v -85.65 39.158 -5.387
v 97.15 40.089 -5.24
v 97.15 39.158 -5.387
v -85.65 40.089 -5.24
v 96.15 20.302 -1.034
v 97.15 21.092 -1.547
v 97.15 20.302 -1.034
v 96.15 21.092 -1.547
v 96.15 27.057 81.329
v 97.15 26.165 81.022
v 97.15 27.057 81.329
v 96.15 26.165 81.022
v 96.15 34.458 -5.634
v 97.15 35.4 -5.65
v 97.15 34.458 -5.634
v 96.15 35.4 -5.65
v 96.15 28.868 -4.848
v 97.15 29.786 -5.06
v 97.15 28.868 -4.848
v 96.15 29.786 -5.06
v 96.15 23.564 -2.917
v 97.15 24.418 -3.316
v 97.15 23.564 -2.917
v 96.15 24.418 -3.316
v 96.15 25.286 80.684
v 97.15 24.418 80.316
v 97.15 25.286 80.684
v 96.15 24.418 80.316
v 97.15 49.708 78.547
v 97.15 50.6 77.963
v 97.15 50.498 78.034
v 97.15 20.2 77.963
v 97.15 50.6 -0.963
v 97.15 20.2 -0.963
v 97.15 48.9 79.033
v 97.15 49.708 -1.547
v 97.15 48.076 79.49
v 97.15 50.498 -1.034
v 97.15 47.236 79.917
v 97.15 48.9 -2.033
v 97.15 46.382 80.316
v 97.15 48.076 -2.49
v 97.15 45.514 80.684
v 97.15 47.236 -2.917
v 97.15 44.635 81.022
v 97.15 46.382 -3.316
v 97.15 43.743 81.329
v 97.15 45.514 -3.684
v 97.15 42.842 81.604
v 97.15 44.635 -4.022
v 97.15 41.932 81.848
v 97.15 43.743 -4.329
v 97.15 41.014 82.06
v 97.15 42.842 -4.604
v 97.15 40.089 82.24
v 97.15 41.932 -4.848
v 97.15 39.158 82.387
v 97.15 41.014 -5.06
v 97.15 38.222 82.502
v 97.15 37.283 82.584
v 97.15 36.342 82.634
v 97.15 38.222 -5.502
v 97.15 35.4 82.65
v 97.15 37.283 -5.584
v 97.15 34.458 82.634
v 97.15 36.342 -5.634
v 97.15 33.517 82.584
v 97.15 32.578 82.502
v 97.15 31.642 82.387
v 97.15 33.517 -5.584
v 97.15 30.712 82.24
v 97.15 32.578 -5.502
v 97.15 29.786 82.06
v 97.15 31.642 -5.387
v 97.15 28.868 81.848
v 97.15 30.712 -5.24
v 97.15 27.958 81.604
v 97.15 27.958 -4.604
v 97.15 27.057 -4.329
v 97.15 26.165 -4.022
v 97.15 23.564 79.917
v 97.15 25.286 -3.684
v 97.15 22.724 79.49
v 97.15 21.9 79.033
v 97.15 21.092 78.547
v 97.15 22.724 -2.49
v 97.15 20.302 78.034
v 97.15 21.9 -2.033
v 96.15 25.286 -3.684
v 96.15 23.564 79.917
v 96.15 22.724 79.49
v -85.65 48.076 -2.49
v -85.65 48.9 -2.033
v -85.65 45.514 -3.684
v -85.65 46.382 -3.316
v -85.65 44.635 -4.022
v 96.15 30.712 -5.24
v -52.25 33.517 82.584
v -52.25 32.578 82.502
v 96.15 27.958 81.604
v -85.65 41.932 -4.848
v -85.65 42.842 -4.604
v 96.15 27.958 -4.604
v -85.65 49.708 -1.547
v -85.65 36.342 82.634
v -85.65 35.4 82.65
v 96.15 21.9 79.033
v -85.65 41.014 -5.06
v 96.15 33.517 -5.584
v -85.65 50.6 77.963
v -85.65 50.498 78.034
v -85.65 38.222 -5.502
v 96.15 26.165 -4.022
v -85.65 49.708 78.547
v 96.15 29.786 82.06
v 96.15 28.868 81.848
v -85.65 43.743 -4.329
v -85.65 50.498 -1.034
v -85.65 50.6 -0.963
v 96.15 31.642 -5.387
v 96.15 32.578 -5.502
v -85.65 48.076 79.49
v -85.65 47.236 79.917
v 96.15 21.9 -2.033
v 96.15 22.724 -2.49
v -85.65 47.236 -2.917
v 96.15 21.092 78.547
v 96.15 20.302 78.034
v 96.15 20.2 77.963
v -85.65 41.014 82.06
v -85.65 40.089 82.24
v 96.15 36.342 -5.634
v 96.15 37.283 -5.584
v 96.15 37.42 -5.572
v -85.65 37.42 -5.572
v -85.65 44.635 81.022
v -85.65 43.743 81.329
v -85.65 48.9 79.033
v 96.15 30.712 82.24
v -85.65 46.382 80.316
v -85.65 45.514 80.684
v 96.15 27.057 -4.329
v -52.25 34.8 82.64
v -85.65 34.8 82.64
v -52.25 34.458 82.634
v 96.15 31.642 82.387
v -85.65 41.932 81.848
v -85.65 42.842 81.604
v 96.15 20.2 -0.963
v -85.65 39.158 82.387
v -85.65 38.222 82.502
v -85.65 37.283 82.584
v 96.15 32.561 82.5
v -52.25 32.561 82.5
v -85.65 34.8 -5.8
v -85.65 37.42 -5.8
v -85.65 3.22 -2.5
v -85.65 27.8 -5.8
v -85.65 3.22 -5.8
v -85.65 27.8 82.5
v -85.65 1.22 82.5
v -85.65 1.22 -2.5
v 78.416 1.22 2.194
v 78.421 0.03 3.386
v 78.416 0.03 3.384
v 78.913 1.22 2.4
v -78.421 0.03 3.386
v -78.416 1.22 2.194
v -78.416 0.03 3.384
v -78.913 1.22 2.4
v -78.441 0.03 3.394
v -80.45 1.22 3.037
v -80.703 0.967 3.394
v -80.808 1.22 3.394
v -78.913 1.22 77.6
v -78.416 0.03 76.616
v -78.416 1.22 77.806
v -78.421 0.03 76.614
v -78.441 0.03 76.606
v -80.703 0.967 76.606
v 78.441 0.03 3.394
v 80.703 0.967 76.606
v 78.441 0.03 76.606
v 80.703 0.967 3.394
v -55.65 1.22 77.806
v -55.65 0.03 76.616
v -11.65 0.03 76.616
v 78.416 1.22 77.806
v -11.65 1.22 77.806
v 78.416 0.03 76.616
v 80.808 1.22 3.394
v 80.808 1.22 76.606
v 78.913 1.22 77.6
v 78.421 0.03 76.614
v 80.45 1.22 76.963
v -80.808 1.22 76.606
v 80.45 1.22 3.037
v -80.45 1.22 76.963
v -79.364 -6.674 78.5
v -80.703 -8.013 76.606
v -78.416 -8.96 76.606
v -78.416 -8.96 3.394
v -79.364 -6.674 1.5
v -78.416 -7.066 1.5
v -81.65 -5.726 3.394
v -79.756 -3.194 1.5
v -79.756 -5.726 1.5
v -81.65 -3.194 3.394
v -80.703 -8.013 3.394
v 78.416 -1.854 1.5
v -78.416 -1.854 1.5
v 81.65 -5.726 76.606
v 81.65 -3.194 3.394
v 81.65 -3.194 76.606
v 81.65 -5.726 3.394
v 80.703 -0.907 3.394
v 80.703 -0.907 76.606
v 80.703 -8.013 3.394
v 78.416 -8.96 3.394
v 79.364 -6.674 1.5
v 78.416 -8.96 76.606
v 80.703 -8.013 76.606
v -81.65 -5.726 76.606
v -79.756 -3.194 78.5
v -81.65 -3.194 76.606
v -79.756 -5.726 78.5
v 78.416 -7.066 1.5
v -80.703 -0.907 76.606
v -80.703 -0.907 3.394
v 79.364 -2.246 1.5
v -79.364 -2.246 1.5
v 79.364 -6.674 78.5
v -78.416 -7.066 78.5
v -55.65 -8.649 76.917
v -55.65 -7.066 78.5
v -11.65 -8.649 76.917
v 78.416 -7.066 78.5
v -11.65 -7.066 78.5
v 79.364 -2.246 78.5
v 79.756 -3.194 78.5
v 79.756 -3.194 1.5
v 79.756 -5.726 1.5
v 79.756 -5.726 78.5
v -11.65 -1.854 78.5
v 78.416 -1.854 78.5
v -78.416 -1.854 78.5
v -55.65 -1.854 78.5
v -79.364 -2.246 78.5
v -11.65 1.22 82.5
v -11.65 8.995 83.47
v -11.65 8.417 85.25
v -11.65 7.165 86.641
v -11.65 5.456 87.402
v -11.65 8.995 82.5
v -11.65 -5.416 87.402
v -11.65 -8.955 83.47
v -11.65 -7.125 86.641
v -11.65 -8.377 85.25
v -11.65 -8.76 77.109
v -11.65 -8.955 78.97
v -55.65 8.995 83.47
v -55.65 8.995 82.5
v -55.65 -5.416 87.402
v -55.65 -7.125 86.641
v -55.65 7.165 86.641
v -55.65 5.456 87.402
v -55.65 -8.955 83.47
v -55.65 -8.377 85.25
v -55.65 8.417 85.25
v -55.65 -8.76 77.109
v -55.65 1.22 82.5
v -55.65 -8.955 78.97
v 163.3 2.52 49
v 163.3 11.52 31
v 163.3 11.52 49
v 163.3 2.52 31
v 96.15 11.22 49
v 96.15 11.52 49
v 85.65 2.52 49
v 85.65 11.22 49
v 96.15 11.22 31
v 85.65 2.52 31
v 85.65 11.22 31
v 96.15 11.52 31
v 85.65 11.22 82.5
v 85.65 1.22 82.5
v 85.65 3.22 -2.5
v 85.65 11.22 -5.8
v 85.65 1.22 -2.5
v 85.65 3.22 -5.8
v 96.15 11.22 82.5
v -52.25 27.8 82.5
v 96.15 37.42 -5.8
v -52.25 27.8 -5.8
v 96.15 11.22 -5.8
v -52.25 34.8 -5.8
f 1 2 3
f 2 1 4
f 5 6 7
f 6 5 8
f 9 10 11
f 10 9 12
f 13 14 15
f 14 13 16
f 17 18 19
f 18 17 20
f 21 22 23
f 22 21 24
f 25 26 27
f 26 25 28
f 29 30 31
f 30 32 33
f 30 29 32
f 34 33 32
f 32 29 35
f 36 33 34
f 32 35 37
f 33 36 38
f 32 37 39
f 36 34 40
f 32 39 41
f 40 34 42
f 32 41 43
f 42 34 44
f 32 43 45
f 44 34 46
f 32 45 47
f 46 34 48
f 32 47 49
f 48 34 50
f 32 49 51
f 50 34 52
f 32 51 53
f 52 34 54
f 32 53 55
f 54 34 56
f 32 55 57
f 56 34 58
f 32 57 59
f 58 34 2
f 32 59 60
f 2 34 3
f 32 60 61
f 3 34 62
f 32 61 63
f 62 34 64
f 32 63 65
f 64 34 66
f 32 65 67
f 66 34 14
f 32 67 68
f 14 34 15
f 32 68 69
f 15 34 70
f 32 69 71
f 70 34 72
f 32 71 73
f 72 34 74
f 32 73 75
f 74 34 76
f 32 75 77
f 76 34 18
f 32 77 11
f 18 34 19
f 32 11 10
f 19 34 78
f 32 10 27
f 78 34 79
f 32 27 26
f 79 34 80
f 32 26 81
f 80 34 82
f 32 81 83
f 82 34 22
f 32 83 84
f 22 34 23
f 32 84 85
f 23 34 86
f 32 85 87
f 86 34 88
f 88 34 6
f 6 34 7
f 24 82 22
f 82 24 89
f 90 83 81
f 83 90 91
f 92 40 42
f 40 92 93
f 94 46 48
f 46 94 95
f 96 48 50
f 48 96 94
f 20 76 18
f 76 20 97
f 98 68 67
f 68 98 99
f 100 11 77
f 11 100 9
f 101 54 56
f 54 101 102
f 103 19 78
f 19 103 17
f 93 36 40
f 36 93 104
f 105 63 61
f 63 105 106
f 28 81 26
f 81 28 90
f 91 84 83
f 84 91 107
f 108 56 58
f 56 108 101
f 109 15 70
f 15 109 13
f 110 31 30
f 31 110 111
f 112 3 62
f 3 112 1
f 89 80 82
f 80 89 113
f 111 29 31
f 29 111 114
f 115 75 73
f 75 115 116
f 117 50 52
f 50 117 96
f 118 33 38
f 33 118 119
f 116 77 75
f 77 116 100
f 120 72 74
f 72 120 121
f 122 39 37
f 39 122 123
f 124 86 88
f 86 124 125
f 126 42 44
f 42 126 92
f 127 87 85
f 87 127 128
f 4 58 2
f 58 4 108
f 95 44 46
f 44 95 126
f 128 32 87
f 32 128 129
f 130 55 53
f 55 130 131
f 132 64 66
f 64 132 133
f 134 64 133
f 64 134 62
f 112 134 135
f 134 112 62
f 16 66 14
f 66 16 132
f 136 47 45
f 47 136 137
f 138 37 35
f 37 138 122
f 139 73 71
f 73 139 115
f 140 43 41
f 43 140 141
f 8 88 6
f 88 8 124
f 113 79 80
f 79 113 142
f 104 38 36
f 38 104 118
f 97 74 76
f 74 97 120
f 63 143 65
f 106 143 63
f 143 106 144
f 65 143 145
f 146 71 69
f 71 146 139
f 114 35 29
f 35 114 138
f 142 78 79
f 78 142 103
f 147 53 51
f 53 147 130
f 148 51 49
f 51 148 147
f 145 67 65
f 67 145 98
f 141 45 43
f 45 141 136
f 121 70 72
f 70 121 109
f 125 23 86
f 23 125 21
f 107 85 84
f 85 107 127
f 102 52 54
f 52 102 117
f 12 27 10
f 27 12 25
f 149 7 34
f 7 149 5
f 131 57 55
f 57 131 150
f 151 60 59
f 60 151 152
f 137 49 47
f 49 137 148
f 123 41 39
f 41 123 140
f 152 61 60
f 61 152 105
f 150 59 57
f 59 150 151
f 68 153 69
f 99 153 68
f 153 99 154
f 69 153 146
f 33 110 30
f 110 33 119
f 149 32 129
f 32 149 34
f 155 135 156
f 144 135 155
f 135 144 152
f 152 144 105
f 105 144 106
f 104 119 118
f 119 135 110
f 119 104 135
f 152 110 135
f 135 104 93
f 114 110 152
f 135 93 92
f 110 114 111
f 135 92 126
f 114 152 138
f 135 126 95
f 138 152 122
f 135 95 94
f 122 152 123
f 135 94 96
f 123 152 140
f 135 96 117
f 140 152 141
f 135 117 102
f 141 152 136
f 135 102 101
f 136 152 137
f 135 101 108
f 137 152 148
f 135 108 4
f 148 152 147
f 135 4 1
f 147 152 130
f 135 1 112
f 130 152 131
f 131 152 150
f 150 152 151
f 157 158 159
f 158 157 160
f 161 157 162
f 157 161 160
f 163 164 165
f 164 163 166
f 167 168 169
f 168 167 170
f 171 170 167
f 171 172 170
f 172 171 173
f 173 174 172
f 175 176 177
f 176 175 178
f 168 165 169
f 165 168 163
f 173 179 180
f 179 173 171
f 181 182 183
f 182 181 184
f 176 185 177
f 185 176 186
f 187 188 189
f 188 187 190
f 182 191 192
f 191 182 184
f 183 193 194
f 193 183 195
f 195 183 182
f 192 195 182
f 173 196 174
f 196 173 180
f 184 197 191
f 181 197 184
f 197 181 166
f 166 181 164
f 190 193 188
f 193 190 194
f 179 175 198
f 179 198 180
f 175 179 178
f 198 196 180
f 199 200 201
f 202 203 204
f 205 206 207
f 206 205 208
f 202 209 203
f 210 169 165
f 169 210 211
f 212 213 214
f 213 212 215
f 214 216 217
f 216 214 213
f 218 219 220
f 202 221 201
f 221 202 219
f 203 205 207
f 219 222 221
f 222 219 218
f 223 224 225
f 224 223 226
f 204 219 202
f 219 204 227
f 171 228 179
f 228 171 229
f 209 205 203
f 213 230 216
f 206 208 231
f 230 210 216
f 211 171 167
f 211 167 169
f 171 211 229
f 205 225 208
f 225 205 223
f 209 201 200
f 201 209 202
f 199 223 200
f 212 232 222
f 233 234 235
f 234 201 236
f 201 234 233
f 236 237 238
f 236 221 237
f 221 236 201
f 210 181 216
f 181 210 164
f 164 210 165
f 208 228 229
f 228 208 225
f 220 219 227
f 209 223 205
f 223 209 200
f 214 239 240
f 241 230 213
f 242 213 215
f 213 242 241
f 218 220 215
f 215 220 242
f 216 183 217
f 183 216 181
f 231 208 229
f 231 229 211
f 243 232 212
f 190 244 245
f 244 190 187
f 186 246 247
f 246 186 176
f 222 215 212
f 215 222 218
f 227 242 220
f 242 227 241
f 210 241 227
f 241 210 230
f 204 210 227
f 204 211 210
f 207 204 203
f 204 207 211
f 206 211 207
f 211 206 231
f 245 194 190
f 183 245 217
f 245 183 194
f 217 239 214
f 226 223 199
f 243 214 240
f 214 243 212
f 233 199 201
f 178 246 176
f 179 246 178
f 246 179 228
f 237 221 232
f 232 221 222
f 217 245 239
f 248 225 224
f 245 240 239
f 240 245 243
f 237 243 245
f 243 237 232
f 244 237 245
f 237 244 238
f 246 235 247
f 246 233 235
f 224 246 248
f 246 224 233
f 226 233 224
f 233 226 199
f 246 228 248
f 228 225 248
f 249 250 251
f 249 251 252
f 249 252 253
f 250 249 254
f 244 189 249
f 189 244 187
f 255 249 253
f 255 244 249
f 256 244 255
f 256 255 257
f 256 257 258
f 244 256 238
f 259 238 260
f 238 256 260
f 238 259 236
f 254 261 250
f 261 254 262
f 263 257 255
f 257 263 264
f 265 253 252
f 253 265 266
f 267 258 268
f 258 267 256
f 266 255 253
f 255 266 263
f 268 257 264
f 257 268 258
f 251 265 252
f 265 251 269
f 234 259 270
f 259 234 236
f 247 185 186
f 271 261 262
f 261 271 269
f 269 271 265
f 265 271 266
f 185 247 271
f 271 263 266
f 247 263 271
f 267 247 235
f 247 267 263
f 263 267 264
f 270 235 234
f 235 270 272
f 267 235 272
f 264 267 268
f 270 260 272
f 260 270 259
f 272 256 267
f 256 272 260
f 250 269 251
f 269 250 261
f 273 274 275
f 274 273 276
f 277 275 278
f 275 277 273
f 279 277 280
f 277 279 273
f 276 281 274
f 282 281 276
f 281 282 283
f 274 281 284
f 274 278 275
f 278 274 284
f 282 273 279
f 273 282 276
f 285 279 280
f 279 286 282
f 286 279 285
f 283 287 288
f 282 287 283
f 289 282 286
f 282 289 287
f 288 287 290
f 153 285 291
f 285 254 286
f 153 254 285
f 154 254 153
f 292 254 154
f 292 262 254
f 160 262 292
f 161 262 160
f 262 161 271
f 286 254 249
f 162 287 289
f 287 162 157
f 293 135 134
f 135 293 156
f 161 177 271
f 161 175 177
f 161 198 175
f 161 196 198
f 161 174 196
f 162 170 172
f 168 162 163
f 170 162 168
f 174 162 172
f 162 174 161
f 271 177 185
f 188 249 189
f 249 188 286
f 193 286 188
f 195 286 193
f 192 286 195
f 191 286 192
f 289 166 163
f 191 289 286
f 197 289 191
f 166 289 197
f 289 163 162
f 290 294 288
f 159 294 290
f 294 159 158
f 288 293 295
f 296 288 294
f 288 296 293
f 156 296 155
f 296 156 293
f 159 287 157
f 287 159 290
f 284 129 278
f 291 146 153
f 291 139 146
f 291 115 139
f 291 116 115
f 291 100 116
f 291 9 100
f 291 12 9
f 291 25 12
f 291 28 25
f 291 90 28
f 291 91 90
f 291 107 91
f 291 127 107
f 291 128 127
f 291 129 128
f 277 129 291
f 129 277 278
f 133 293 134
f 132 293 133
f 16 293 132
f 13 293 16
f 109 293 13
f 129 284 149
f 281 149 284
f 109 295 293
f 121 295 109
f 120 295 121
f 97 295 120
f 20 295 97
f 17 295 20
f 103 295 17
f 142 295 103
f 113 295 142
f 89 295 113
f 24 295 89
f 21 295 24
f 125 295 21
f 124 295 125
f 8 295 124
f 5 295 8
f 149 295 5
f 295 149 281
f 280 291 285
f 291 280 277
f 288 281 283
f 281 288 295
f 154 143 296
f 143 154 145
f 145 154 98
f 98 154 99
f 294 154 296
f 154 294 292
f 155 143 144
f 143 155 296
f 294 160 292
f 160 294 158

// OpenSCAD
// file: ../chamferer.scad
INFINITY = 10000;
ATOM = .01;

module chamfer_tool(r, fn, tool) {
    if (tool=="sphere") {
        sphere(r, $fn=fn);
    }
    else if (tool=="hemisphere-up") {
        intersection() {
            sphere(r, $fn=fn);
            cylinder(r=r*2, h=r*2);
        }
    }
    else if (tool=="cone") {
        cylinder(r, r, 0, $fn=fn);
        scale([1, 1, -1])
        cylinder(r, r, 0, $fn=fn);
    }
    else if (tool=="cone-up") {
        cylinder(r, r, 0, $fn=fn, center=true);
    }
    else if (tool=="cone-down") {
        scale([1, 1, -1])
        cylinder(r, r, 0, $fn=fn, center=true);
    }
    else if (tool=="octahedron") {
        resize([r*2, r*2, r*2]) {
            cylinder(r, r, 0, $fn=4);
            scale([1, 1, -1])
            cylinder(r, r, 0, $fn=4);
        }
    }
    else if (tool=="pyramid") {
        resize([r*2, r*2, r*2]) {
            cylinder(r, r, 0, center=true, $fn=4);
        }
    }
    else if (tool=="rpyramid") {
        resize([r*2, r*2, r*2]) {
            cylinder(r, 0, r, center=true, $fn=4);
        }
    }
    else if (tool=="cylinder") {
        cylinder(r=r, h=ATOM, $fn=fn);
    }
    else if (tool=="cube") {
        cube(r*2, center=true);
    }
    else {
        assert(false, str("Unknown tool: ", tool));
    }
}

module shrinker(r, tool="sphere", fn=8) {
    if (!r) {
        children();
    }
    else {
        // re-invert+grow = fillet
        difference() {
            cube(INFINITY/2, center=true);

            // invert+grow = carve
            minkowski() {
                difference() {
                    cube(INFINITY, center=true);
                    children();
                }
                //cube(r, center=true);
                chamfer_tool(r, fn=fn, tool=tool);
            }
        }
    }
}

module chamferer(r, tool="sphere", fn=8, shrink=true, grow=true) {
    if (!r) {
        children();
    }
    else {
        minkowski() {
            if (shrink)
                shrinker(r, tool, fn) children();
            else
                children();
            
            if (grow)
                chamfer_tool(r, fn=fn, tool=tool);
        }
    }
}



cube(50);

translate([70, 0, 0])
chamferer(5, "hemisphere-up", $preview? 6*4 : 30)
//shrinker(5, "sphere", $preview? 6*4 : 30)
cube(50);

translate([70*2, 0, 0])
chamferer(5, "octahedron", grow=false)
cube(50);
// main file
use <../chamferer.scad>

BATT_L      = 146           +1;
BATT_W      = 108           +0.2;
BATT_TH     =  39           -2;

PHONE_L     = 163           +.3;
PHONE_W     =  77;
WALL        =   3.5;
BEXTEND     =  30           *0;

SCREW_DIST  = 127.5;


L    = PHONE_L+WALL*2 + (BATT_W-77)            -28;
W    = BATT_W+WALL*2;
TH   = 9+BATT_TH  +14.2 + WALL*2 + BEXTEND      -5;

CH   = WALL*1.25;

ATOM = .02;
FN   = $preview? 8 : 60;

echo(TH);

PHONE_CASE_L  = PHONE_L + 4*2;
PHONE_CASE_TH = 21;
PHONE_CASE_W  = PHONE_W + 4*2;

module phone_cavity(back_extension=0, just_case=false) {
    l = PHONE_L;
    w = PHONE_W;
    th = 9;
    ch = 3.5;
    // case
    bor =  4;
    cy  =  1.2;
    cth = PHONE_CASE_TH;
    xz  =  5.5;
    xy =   2;

    translate([-l/2, 0, 0]) {
        if (!just_case) {
            // phone
            chamferer(ch)
            cube([l, th, w]);

            // screen clearance
            translate([0, -th+ATOM, 0])
            chamferer(ch)
            cube([l, th, w]);

            // buttons clearance
            x = 26;
            dx = 44;
            hull() {
                for (z=[0, th/2])
                for (y=[th/2, -th/2]) {
                    translate([x, y, w+z])
                    rotate([0, 90, 0])
                    cylinder(d=th, h=dx);
                }
            }
            
            // USB clearance
            pl = 18;
            translate([l/2, 1 + 1.5, w/2-pl/2])
            cube([l, th, pl]);

            translate([-bor, cy, -bor])
            cube([l + bor*2, cth+back_extension, w + bor*2]);

            translate([-bor, cy, -bor])
            cube([l + bor*2, cth+back_extension, w + bor*2]);

            translate([-bor, cy+xy, -bor-xz + 2 +.2])
            cube([l + bor*2, cth-xy+back_extension, xz+ATOM]);

            // side extension
            dy = 10;
            side_extension = WALL*3;
            translate([-bor, cy+dy,  -bor-xz + 2 +.2])
            cube([l + bor*2+side_extension, cth+back_extension-dy, w+bor+xz+2-.2]);


        }
        else {
            translate([-bor, cy+cth, -bor])
            cube([l + bor*2, ATOM, w + bor*2]);
            translate([-bor, cy+cth, -bor-xz + 2 +.2])
            cube([l + bor*2, ATOM, xz+ATOM]);
        }
    }
}

BANK_PLAY = .2  + .2;
BANK_LENGTH    =  86.5 + BANK_PLAY + 1.4;
BANK_WIDTH     =  30.0 + BANK_PLAY;
BANK_DIAMETER  =  54.0;
BANK_HEIGHT    = 137.5 + BANK_PLAY + 1;

PHONE_CASE_Y   = 1.2;

module power_bank(w=BANK_WIDTH, l=BANK_LENGTH, d=BANK_DIAMETER, h=BANK_HEIGHT) {
    side_extension = WALL*3;
    intersection() {
        hull() {
            dd=(l - d)/2;
            fn = $preview ? 24 : 180;
            translate([-dd, 0, 0]) cylinder(d=d, h=h+side_extension, $fn=fn);
            translate([+dd, 0, 0]) cylinder(d=d, h=h+side_extension, $fn=fn);           
        }
        cube([l*2, w, h*4], center=true);
    }
}

module cavity() {
    dx = (PHONE_CASE_L - BANK_HEIGHT)/2;
    dy = PHONE_CASE_TH + PHONE_CASE_Y;
    dz = (PHONE_W - BANK_LENGTH)/2;
    pb_dy = -2;
    h=(PHONE_CASE_L - BANK_HEIGHT);

    difference() {
        union() {
            // power bank
            translate([-BANK_HEIGHT/2 + dx+1, BANK_WIDTH/2 + dy + pb_dy, BANK_LENGTH/2 + dz])
            rotate([0, 90, 0])
            power_bank();

            // cable stash
            translate([-BANK_HEIGHT/2 + dx -h, BANK_WIDTH/2 + dy + pb_dy, BANK_LENGTH/2 + dz]) 
            rotate([0, 90, 0])
            power_bank(h=h+ATOM);

            // phone
            translate([0, ATOM, 1.5])
            phone_cavity(back_extension=BANK_WIDTH/2);
        }

        // separatior
        translate([-BANK_HEIGHT*1.5 + dx+1, BANK_WIDTH/4 + dy + pb_dy, dz-WALL/2]) 
                cube([BANK_HEIGHT,
                      WALL*2, BANK_LENGTH+WALL], center=!true);
    }
}

!cavity();

module boombox() {
    difference() {
        dz = (PHONE_W - BANK_LENGTH)/2;
        h = BANK_LENGTH;
        xz = WALL*2.7;
        dy = 1;
        l = PHONE_CASE_L + WALL*2;

        chamferer(CH, fn=FN)
        translate([-l/2, -dy, dz - xz/2 -1.25])
        cube([l, PHONE_CASE_Y+PHONE_CASE_TH + BANK_WIDTH+dy+WALL, h+xz]);
        
        cavity();
    }
}

rotate([0, $preview ? 0 : -90, 0])
boombox();
